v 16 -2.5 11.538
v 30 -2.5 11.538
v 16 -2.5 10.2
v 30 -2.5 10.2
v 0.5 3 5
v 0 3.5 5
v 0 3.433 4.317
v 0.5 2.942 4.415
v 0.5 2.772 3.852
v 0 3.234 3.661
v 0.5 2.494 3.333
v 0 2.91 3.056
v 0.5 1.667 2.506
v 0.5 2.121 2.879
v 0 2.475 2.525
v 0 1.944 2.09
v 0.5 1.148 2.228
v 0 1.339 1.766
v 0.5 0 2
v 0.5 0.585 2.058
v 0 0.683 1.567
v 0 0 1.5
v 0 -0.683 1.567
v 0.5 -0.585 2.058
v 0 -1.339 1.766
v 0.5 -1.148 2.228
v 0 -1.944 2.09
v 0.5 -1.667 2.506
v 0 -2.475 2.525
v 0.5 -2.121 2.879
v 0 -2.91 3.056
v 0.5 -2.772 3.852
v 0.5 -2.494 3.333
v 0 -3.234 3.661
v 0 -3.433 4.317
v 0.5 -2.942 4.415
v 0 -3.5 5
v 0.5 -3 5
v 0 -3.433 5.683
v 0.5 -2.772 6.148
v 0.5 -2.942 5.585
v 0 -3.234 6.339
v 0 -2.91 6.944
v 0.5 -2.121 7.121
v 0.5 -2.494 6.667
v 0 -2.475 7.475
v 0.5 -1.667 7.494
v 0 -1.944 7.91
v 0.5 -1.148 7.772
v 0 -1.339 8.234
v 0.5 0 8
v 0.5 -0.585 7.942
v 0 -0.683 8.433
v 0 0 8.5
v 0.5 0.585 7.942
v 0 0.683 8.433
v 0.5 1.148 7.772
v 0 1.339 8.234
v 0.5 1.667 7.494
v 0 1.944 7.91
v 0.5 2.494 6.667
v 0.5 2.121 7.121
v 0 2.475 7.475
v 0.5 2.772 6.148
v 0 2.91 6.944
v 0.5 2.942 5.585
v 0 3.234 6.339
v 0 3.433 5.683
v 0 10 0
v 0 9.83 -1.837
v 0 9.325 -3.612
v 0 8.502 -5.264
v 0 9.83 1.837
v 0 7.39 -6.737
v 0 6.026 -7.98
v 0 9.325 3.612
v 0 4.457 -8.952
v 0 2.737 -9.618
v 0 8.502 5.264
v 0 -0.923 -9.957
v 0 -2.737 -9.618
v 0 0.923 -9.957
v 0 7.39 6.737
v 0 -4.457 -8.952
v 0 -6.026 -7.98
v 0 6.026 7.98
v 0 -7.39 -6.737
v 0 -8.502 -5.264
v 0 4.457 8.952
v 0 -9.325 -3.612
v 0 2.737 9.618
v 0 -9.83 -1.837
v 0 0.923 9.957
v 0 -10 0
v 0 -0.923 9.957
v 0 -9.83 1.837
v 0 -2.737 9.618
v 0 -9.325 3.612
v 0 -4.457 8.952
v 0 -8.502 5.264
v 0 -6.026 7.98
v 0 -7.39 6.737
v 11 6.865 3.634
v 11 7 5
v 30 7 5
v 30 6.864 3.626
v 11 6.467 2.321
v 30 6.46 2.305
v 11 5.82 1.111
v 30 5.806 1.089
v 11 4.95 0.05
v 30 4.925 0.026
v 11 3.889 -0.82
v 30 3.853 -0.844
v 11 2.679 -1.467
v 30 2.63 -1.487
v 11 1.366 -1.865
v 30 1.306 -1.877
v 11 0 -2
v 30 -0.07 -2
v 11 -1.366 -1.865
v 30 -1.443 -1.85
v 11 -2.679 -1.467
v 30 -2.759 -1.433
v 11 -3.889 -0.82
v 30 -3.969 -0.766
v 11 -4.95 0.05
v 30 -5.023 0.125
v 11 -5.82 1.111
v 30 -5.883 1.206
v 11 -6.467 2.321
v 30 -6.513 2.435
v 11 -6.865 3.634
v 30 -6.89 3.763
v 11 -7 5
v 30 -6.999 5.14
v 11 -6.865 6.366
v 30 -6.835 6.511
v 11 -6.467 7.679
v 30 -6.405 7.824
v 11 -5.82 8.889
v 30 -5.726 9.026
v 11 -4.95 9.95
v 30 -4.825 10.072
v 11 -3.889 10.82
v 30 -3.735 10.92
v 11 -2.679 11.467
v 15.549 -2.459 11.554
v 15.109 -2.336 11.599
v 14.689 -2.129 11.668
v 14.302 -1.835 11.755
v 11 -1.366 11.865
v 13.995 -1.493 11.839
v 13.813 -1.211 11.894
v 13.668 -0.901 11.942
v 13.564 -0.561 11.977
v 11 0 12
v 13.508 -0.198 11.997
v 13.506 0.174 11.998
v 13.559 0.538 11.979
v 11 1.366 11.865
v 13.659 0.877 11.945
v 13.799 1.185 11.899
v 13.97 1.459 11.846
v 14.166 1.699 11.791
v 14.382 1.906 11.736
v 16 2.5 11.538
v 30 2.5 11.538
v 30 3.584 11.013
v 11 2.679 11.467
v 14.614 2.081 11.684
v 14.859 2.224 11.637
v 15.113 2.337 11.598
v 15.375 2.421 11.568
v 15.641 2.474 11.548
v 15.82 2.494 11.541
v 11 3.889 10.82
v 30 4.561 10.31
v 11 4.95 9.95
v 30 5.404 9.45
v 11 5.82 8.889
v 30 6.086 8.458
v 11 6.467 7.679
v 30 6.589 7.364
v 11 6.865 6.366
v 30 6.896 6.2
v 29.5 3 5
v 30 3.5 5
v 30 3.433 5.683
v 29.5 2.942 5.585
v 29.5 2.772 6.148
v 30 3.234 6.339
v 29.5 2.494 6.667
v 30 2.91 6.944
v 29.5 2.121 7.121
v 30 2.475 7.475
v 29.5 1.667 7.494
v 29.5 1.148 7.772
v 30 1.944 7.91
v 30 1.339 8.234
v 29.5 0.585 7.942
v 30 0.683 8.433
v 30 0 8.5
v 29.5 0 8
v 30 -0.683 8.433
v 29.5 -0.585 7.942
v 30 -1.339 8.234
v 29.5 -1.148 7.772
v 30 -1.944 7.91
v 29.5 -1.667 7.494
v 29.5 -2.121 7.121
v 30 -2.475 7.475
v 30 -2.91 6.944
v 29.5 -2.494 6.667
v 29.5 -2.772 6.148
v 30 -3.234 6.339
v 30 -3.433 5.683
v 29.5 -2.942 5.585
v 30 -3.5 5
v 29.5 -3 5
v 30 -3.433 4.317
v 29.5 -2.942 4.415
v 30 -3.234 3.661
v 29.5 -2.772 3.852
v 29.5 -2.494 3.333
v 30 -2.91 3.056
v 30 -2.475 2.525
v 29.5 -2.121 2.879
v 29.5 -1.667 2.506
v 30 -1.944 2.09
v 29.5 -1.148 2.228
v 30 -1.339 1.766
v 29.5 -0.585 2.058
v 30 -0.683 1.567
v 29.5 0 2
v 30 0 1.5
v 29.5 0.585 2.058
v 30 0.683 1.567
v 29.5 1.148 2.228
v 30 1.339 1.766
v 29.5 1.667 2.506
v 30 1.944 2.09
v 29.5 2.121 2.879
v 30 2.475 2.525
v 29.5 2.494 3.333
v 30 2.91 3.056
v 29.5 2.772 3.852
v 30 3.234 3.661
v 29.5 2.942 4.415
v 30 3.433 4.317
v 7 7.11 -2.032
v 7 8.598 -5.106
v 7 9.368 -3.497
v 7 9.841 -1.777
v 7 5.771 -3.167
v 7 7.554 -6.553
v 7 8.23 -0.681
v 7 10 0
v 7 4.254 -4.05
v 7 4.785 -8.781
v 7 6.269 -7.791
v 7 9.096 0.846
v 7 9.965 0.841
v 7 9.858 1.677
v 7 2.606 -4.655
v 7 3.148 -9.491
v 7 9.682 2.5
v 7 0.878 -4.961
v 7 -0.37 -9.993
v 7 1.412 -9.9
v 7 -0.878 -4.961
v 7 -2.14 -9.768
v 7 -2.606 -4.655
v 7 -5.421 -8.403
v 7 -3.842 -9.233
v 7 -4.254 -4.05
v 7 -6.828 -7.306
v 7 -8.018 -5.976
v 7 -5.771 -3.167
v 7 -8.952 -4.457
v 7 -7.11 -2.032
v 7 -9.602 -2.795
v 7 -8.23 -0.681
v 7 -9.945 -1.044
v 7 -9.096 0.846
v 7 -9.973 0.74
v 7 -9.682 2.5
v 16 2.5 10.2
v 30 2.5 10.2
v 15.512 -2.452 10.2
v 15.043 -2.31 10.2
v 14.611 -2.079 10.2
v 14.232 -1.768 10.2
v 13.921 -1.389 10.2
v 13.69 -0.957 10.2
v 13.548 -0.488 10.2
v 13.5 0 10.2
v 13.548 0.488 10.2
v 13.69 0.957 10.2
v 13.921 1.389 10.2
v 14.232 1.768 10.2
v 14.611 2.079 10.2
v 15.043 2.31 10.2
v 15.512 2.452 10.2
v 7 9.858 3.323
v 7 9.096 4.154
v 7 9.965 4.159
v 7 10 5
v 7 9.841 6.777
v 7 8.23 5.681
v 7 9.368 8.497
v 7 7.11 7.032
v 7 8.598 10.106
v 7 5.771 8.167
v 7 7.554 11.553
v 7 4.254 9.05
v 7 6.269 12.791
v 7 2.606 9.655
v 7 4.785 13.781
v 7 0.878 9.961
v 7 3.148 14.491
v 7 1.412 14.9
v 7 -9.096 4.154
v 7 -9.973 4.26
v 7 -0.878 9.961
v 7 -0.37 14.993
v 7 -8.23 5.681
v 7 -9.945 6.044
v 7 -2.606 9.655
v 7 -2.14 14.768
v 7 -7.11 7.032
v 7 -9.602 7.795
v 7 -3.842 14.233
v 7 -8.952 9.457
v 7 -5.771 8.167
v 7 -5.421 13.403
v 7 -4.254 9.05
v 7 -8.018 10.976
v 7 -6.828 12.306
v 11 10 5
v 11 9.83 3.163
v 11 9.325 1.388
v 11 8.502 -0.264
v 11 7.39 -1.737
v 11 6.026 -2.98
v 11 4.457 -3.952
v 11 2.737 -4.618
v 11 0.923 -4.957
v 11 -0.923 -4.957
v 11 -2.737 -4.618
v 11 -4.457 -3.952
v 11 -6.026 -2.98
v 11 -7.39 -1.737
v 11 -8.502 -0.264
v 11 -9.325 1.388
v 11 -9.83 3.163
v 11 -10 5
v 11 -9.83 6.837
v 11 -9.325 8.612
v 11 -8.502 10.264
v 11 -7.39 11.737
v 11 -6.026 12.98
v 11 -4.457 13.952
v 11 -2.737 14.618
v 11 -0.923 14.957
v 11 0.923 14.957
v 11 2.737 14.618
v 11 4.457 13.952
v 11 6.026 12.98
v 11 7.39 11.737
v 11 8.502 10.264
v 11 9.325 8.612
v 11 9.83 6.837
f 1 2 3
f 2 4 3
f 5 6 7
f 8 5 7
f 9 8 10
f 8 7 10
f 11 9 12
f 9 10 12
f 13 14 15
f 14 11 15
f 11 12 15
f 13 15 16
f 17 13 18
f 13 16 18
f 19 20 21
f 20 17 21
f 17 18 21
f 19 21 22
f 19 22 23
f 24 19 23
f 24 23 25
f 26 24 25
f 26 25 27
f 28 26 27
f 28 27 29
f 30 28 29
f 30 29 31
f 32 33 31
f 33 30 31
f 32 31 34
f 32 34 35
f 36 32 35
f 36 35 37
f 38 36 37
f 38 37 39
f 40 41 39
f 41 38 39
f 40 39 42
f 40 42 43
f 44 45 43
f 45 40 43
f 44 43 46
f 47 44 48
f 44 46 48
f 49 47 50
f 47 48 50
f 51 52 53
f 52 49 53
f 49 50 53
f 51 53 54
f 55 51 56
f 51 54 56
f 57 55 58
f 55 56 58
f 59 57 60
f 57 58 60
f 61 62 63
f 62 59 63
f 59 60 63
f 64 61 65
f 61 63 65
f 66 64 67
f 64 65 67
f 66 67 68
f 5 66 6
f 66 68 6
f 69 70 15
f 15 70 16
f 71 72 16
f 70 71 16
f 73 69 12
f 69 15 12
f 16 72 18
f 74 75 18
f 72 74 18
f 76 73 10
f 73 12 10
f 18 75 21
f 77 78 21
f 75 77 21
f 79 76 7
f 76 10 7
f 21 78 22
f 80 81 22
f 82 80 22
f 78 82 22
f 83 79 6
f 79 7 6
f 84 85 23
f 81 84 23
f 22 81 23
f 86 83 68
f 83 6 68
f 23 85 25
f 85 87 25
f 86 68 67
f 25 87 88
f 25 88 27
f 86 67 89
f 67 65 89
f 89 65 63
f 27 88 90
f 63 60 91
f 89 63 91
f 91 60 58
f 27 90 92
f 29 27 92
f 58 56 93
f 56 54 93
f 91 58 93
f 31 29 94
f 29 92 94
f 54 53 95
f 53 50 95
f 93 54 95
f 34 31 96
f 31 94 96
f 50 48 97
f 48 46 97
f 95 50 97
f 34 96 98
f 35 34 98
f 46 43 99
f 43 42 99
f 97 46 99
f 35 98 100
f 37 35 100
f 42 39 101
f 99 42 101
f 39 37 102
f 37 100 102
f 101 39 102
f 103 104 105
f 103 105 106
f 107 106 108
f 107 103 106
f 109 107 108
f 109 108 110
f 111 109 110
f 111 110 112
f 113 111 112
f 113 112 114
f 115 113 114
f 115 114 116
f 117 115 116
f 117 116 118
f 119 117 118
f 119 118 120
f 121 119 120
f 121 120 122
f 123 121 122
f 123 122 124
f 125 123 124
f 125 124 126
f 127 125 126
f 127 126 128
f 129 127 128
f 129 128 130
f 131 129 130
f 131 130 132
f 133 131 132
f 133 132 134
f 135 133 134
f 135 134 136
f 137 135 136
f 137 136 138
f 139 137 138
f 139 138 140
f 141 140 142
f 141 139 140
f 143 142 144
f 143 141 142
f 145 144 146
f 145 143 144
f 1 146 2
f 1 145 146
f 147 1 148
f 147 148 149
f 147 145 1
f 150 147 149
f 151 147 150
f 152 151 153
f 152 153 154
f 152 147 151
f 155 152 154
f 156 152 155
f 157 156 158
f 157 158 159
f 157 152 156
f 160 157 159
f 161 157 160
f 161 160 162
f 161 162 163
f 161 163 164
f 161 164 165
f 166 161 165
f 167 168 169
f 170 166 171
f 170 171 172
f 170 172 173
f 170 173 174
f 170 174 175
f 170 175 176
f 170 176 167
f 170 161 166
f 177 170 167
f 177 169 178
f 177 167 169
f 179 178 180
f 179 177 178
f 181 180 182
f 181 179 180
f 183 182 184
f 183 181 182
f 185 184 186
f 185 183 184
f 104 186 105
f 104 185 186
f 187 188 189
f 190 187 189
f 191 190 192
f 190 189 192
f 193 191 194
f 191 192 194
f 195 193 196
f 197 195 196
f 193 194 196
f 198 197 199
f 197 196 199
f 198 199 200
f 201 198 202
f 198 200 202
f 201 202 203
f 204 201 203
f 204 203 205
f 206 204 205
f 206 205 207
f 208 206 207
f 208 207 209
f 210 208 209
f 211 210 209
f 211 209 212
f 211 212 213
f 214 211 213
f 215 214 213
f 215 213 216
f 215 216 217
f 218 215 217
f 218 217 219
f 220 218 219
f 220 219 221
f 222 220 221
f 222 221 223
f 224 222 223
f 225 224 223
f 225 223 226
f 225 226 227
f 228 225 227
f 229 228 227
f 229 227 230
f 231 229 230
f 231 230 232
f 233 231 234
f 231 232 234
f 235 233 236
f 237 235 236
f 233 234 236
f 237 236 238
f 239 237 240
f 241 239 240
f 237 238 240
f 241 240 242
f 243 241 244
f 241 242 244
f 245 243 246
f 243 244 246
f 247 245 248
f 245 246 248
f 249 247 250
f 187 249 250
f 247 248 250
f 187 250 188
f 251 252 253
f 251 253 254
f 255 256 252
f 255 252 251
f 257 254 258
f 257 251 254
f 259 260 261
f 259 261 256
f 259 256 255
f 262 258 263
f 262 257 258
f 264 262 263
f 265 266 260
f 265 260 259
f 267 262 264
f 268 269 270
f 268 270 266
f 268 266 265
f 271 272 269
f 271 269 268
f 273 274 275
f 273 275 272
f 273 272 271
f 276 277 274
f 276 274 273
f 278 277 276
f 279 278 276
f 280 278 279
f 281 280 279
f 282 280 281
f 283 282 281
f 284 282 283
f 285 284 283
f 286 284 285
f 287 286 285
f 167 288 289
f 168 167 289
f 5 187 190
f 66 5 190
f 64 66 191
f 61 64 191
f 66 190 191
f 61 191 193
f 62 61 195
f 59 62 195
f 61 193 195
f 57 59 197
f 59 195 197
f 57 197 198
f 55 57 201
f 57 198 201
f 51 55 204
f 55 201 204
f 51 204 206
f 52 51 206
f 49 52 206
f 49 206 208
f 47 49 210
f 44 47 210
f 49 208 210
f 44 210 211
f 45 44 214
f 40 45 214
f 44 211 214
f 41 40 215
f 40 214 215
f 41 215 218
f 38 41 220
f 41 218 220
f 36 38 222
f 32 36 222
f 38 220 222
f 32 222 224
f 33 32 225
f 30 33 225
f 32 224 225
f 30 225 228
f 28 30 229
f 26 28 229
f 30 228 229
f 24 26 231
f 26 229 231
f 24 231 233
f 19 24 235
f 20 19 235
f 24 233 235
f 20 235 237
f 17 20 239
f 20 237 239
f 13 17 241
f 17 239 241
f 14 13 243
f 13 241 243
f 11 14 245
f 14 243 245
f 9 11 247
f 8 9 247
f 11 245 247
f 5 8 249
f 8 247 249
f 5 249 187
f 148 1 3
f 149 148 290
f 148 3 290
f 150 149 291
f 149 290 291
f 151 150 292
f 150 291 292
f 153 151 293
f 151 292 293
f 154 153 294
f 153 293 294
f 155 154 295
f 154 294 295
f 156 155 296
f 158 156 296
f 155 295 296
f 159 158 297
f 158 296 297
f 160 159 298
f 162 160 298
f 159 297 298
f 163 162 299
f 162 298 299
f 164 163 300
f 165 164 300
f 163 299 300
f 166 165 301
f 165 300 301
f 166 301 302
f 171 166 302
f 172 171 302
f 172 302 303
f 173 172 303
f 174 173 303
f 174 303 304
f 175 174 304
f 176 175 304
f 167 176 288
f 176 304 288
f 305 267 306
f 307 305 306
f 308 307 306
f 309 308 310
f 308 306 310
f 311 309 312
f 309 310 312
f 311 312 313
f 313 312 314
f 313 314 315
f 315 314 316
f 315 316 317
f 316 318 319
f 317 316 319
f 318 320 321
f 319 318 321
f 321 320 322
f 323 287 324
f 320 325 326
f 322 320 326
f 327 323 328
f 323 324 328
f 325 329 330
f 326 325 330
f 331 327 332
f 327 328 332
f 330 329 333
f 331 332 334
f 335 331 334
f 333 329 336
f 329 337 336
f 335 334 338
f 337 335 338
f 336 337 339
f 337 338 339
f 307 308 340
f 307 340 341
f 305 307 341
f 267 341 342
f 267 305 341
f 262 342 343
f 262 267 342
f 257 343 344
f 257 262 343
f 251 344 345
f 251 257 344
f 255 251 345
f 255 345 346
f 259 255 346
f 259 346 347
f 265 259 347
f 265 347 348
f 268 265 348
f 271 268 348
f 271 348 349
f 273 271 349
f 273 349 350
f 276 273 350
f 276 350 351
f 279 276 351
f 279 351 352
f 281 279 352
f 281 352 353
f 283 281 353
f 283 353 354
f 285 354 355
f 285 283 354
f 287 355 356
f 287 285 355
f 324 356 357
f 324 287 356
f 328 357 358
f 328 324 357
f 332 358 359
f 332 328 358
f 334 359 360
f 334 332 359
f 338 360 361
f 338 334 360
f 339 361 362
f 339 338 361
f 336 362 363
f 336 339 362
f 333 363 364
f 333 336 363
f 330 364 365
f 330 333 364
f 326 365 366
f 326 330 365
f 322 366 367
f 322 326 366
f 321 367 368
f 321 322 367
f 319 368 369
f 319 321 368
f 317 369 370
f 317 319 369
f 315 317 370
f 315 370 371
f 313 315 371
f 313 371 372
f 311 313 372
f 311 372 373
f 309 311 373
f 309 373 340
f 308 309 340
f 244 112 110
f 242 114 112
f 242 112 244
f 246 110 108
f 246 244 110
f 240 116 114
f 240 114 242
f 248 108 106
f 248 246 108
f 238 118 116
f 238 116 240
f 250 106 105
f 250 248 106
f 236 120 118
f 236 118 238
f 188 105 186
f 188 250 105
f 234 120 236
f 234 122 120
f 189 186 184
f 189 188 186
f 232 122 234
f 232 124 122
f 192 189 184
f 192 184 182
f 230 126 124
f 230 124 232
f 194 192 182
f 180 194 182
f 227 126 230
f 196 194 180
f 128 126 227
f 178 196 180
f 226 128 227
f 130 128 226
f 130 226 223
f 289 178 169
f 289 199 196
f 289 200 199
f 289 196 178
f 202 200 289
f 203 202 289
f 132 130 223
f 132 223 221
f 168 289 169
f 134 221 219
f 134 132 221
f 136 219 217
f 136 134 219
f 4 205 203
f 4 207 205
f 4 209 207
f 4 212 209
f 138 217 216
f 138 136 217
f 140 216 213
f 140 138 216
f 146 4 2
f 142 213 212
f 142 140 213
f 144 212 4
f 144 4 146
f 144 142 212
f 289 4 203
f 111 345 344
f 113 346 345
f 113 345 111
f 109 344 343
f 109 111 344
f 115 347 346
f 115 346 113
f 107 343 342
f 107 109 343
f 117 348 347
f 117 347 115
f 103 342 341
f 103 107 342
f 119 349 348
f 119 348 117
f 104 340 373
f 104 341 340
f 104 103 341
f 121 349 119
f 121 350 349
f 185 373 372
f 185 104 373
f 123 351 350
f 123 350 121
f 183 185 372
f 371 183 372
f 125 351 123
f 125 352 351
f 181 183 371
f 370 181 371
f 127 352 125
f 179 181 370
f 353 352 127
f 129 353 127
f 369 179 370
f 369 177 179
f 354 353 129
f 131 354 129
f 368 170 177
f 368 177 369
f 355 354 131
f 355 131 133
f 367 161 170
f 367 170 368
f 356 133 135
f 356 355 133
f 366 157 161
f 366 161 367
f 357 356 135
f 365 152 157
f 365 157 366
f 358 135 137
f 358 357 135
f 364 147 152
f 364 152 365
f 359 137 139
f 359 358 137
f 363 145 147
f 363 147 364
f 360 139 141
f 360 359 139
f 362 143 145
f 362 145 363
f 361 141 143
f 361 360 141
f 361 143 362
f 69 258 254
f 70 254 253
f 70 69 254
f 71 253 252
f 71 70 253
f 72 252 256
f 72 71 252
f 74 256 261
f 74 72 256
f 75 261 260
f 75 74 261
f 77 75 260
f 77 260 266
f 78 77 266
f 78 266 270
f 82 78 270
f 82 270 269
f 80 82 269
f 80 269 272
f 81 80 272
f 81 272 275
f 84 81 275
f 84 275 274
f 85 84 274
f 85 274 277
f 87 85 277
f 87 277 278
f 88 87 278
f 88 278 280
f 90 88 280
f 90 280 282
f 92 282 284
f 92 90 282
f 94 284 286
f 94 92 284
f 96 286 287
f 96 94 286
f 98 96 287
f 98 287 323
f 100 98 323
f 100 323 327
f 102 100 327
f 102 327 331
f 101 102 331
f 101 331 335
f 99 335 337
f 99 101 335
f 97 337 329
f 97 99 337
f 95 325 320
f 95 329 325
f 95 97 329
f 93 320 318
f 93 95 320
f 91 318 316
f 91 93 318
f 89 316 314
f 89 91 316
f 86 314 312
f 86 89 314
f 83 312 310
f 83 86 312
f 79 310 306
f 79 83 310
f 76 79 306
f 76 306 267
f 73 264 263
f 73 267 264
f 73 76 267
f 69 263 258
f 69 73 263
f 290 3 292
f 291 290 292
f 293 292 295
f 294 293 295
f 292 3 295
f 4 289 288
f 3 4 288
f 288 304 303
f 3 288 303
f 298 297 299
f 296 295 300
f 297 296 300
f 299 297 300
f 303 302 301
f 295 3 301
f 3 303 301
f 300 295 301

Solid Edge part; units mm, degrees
sketch "Sketch1" plane through (0, 0, 0) normal (1, 0, 0) x (0, 1, 0)
  circle A0 centre (0, 0) radius 10
extrude "Protrusion1" add sketch "Sketch1" along normal blind 7
sketch "Sketch2" plane through (7, 0, 0) normal (1, 0, 0) x (0, 1, 0)
  circle A0 centre (0, 5) radius 10
extrude "ExtrudedProtrusion_2" add sketch "Sketch2" along normal blind 4
sketch "Sketch3" plane through (11, 0, 5) normal (1, 0, 0) x (0, 1, 0)
  circle A0 centre (0, 0) radius 7
extrude "ExtrudedProtrusion_3" add sketch "Sketch3" along normal blind 19
sketch "Sketch4" plane through (30, 0, 5) normal (1, 0, 0) x (0, 1, 0)
  circle A0 centre (0, 0) radius 3
extrude "ExtrudedCutout_1" cut sketch "Sketch4" against normal blind 61.3249
chamfer "Chamfer_2" distance 0.5 angle 45 2 edges at (0, 3, 5) (30, -3, 5) measured on face at (5.3, 1.6602, 7.4988)
sketch "Sketch5" plane through (0, 0, 10.2) normal (0, 0, 1) x (1, 0, 0)
  line L0 (31, 2.5) -> (31, -2.5)
  line L1 (31, -2.5) -> (16, -2.5)
  arc A0 (16, -2.5) -> (16, 2.5) centre (16, 0) cw
  line L2 (16, 2.5) -> (31, 2.5)
extrude "ExtrudedCutout_2" cut sketch "Sketch5" along normal blind 26.2819
